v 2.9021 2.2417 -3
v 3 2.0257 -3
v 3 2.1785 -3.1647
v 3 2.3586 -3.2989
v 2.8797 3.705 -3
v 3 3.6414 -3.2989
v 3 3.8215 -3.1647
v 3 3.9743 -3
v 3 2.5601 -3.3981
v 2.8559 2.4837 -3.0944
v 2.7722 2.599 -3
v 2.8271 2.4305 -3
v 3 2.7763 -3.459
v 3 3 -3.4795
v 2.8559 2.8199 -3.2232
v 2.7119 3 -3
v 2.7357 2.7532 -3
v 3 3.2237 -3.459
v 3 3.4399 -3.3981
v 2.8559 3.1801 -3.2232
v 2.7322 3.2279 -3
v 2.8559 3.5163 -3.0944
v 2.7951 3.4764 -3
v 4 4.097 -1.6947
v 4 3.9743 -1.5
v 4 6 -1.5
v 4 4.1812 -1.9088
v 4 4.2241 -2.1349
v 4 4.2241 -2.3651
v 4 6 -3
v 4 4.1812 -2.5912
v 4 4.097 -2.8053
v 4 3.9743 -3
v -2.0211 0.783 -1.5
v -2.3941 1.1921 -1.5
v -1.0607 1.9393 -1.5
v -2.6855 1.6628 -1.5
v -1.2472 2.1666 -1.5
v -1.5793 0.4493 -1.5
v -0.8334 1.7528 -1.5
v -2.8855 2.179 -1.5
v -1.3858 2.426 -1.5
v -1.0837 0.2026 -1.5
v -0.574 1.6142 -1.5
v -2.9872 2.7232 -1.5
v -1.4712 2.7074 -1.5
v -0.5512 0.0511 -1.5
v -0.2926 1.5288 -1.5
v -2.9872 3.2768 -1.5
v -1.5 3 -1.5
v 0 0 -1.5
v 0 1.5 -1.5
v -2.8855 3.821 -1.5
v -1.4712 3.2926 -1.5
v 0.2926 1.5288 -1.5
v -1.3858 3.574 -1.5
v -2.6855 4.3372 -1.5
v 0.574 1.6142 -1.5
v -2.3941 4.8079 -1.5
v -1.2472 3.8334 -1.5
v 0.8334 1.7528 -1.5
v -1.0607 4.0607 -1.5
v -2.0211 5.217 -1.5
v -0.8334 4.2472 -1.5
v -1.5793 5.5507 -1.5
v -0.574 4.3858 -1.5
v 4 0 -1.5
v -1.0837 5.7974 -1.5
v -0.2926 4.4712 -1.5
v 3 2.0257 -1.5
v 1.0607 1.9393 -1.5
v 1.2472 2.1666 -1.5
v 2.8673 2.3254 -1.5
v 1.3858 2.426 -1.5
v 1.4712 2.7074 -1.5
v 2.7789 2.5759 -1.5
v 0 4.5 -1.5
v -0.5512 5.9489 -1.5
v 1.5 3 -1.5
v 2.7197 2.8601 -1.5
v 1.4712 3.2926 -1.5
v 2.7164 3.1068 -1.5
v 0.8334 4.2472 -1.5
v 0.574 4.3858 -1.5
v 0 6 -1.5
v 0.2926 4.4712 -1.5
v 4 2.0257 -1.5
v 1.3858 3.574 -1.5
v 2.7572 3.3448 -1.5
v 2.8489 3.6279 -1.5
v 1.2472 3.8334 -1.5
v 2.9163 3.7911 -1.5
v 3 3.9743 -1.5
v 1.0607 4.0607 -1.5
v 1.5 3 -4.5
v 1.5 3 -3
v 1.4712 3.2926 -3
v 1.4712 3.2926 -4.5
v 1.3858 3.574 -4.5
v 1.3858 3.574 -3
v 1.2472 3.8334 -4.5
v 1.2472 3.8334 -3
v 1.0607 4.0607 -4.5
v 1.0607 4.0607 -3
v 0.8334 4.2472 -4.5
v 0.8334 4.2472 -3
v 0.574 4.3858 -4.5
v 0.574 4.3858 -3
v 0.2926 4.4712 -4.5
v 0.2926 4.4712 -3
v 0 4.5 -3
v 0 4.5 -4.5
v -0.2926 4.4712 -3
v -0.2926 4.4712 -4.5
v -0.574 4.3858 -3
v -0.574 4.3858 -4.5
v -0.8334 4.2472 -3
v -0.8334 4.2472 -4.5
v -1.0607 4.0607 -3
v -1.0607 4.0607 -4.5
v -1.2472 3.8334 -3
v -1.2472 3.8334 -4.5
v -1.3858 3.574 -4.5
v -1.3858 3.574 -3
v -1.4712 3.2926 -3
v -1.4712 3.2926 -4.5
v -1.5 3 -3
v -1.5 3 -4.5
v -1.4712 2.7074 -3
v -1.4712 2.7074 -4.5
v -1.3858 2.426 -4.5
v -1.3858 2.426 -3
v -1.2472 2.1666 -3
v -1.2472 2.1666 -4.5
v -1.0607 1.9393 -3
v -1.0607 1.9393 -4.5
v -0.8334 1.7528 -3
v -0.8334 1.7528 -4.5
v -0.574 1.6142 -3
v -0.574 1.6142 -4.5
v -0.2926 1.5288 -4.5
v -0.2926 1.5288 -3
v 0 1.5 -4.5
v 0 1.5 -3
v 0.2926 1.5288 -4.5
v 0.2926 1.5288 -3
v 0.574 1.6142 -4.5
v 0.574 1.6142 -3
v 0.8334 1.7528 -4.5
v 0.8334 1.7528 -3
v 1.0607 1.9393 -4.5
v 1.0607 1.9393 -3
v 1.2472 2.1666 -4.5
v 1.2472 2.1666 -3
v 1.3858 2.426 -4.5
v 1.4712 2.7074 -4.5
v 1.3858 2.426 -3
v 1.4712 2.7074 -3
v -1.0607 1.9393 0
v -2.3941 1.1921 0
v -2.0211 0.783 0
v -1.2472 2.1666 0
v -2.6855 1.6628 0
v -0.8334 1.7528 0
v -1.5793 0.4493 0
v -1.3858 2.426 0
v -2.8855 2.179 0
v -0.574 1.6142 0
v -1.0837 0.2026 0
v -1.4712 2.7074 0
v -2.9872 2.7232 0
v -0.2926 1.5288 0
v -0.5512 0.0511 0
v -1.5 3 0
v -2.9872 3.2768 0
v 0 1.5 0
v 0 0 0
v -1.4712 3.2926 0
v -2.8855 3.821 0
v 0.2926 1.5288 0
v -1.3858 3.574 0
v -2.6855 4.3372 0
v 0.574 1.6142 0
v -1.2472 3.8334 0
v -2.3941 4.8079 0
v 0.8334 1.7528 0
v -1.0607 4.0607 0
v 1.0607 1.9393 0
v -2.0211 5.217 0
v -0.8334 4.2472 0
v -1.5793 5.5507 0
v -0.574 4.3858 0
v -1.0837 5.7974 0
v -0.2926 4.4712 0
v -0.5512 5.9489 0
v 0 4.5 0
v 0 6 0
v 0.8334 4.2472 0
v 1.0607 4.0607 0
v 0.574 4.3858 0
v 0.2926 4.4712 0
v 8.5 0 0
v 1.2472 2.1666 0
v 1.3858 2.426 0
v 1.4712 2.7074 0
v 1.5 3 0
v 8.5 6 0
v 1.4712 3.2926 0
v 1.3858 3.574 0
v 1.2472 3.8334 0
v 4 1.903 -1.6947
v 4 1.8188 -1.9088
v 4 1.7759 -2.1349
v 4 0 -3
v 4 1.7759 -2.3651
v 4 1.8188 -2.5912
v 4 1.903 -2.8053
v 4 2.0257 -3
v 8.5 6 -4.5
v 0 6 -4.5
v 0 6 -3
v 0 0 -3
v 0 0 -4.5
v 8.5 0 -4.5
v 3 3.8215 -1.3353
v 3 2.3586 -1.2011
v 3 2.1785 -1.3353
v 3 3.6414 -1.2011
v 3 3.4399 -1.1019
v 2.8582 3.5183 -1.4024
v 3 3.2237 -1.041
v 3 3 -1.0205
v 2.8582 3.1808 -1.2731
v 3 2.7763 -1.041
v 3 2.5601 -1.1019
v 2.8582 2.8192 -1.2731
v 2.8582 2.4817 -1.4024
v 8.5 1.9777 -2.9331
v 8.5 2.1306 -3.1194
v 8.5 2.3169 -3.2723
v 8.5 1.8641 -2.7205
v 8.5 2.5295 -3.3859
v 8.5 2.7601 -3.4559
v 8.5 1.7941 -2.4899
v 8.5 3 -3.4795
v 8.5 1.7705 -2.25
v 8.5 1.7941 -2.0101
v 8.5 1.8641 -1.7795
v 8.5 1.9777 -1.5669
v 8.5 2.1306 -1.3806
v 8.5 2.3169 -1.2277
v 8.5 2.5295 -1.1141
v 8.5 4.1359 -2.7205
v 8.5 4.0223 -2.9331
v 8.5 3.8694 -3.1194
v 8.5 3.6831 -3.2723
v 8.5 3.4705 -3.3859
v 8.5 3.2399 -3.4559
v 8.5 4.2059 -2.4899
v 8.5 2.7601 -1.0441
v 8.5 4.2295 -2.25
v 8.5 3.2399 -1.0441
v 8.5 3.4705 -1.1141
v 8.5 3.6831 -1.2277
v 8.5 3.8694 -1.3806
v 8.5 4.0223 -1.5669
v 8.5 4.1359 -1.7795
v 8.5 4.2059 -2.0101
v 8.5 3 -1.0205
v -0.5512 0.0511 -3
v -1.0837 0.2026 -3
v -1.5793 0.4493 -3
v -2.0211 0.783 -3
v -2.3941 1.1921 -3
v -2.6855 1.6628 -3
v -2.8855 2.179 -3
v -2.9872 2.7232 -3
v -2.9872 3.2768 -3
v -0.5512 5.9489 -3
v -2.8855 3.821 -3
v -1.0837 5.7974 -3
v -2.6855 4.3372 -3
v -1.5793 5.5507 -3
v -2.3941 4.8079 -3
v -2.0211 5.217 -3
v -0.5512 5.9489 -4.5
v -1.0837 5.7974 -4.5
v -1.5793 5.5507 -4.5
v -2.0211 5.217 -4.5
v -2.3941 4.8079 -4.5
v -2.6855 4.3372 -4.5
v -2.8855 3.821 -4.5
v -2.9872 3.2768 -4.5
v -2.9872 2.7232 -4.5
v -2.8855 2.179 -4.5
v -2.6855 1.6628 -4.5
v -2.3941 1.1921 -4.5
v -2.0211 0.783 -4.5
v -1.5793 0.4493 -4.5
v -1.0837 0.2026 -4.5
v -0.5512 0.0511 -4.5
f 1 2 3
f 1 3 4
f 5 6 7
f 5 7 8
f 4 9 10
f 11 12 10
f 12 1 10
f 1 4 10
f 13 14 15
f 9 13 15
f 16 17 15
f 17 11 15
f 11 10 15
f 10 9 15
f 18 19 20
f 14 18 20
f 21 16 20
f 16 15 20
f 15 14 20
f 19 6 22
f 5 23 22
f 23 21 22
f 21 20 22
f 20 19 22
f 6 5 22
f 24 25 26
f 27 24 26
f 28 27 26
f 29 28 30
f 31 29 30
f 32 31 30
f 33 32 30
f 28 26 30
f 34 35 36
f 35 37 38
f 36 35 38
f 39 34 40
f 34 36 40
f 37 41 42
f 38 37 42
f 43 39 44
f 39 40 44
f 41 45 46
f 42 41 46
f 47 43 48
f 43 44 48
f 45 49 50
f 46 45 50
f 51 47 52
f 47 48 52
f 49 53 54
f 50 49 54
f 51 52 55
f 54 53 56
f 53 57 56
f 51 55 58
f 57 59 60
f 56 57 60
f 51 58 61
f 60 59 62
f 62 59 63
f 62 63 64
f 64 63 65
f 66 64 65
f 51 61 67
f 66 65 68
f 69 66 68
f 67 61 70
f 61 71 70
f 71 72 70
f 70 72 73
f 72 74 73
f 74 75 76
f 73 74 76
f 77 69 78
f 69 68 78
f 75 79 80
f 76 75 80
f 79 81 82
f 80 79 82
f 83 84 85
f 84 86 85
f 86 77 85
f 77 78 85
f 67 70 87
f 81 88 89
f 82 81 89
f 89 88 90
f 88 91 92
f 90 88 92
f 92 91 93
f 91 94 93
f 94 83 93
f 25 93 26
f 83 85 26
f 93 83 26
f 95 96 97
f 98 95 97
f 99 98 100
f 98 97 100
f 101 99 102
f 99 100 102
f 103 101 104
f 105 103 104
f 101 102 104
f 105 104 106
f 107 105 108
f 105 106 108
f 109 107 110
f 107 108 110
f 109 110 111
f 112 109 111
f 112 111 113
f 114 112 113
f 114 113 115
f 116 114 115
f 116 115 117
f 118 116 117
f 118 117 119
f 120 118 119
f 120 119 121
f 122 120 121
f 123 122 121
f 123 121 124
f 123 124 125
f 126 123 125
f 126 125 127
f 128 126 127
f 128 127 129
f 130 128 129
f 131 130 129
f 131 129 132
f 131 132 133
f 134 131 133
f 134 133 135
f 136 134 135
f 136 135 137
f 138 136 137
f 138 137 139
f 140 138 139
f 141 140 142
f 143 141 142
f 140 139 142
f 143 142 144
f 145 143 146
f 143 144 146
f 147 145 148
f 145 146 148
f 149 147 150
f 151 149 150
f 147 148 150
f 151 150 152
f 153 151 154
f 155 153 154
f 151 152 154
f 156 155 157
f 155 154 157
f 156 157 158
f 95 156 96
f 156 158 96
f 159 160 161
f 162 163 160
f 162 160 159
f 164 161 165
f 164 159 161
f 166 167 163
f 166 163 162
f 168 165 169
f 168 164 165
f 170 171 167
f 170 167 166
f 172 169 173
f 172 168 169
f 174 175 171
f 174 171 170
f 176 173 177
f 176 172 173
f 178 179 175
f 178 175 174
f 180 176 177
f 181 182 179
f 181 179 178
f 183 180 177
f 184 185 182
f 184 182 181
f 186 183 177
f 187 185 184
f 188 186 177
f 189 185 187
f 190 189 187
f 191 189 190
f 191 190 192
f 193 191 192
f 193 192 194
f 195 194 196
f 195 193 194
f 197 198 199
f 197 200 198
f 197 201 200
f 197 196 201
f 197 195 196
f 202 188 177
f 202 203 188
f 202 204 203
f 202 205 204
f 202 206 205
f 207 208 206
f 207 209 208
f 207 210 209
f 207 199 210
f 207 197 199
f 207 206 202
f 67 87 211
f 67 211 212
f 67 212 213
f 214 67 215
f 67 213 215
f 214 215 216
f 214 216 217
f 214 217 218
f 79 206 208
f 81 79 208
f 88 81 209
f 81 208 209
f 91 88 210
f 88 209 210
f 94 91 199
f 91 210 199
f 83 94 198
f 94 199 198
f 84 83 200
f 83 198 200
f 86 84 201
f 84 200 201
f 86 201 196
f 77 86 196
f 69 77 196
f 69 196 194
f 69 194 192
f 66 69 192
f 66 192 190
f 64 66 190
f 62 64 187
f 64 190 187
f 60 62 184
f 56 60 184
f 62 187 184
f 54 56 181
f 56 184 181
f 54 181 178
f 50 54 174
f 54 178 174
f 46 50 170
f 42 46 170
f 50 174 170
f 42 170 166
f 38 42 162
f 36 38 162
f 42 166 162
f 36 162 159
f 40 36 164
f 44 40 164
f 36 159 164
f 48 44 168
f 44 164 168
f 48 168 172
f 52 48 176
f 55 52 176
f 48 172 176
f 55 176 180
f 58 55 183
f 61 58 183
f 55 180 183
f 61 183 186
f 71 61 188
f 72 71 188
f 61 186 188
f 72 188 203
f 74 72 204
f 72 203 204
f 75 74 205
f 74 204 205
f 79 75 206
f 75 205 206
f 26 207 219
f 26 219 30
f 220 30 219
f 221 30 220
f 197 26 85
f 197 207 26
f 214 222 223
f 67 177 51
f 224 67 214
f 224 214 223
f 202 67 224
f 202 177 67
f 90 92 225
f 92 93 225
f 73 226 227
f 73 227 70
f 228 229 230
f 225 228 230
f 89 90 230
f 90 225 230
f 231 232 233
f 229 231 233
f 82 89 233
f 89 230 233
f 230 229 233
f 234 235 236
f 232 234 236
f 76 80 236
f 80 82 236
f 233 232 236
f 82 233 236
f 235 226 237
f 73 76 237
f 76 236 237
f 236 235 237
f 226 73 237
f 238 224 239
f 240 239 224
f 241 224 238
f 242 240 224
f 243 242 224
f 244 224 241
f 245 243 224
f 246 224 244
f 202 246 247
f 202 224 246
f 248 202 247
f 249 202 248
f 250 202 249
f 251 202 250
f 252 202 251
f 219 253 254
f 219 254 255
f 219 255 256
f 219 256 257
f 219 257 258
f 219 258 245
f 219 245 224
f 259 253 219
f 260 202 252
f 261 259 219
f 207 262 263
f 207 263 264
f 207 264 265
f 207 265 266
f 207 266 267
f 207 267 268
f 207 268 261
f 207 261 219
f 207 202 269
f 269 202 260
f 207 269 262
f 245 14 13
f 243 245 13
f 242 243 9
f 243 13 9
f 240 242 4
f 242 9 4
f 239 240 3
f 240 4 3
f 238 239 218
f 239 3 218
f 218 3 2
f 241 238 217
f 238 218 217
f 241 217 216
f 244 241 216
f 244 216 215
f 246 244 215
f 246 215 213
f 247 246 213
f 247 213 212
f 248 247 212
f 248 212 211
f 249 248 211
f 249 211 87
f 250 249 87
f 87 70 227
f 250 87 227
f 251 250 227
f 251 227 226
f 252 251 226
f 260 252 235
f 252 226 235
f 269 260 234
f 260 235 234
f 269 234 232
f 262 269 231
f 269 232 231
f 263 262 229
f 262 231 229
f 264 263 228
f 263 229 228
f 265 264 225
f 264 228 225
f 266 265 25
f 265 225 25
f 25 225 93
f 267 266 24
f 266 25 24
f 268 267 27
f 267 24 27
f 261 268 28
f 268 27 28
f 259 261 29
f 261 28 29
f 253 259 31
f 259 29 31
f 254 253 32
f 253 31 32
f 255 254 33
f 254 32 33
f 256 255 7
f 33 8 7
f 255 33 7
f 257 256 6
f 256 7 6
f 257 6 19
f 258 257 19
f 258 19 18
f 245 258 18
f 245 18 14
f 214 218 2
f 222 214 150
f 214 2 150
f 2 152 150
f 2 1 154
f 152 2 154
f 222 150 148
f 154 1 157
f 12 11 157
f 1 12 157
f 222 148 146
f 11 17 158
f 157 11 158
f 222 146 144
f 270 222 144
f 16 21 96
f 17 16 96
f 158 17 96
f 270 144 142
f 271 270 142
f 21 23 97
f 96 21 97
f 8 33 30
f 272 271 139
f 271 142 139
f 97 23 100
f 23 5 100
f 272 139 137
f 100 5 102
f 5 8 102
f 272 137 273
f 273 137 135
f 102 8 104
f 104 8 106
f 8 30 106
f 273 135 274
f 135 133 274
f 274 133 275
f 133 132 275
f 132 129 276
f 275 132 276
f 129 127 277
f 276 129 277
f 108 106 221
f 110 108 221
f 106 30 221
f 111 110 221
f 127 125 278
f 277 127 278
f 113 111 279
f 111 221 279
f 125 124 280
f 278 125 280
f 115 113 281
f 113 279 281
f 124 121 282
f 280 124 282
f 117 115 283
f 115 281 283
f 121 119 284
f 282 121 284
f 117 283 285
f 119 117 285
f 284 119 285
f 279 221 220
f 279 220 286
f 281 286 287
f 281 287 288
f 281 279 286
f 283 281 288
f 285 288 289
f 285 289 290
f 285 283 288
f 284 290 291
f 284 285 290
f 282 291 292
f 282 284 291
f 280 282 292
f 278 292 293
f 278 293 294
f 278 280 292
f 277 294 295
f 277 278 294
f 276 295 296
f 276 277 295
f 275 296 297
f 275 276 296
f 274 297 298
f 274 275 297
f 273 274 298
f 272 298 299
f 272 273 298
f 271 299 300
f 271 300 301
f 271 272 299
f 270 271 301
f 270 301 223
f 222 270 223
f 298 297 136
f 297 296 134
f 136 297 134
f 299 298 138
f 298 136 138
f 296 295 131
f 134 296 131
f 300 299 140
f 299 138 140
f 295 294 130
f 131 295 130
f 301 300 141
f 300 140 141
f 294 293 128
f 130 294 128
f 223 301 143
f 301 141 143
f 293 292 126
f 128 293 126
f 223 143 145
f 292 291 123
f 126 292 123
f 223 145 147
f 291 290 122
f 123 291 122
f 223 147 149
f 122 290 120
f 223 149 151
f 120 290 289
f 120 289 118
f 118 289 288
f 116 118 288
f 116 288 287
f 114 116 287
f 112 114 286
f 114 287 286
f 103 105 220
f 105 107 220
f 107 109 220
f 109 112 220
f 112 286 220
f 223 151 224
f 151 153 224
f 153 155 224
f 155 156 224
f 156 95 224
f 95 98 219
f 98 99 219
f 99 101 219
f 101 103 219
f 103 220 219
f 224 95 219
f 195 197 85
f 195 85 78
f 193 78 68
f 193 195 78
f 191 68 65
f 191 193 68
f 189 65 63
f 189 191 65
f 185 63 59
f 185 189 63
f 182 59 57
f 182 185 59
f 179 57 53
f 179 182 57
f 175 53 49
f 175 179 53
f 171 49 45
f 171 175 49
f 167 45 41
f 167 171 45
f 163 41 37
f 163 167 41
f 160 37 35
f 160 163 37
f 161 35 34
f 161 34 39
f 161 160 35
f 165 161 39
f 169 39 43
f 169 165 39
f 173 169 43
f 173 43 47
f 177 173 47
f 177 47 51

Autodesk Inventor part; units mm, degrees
ref_plane "YZ Plane" through (0, 0, 0) normal (1, 0, 0) x (0, 1, 0)
ref_plane "XZ Plane" through (0, 0, 0) normal (0, 1, 0) x (-1, 0, 0)
ref_plane "XY Plane" through (0, 0, 0) normal (0, 0, 1) x (1, 0, 0)
sketch "Sketch1" plane through (0, 0, 0) normal (0, 0, 1) x (1, 0, 0)
  line L0 (0, 0) -> (8.5, 0)
  line L1 (8.5, 0) -> (8.5, 6)
  line L2 (8.5, 6) -> (0, 6)
  line L3 (0, 6) -> (0, 0) construction
  circle A0 centre (0, 3) radius 3
  circle A1 centre (0, 3) radius 1.5
  dimension "d0" = 8.5
  dimension "d1" = 6
  dimension "d2" = 3
extrude "Extrusion1" add sketch "Sketch1" against normal blind 4.5
sketch "Sketch2" plane through (0, 6, 0) normal (0, 1, 0) x (1, 0, 0)
  line L0 (8.5, 0) -> (8.5, 4.5) projected
  line L1 (0, 0) -> (0, 0) projected
  line L2 (0, 0) -> (0, 4.5) projected
  line L3 (0, 4.5) -> (0, 4.5) projected
  line L4 (0, 0) -> (0, 4.5) projected
  line L5 (-3, 0) -> (-3, 4.5) projected
  line L6 (-3, 0) -> (0, 0) projected
  line L7 (0, 4.5) -> (-3, 4.5) projected
  line L8 (-3, 1.5) -> (4, 1.5)
  line L9 (4, 1.5) -> (4, 3)
  line L10 (4, 3) -> (-3, 3)
  line L11 (-3, 3) -> (-3, 1.5)
  point P0 (4, 2.25)
  point P1 (8.5, 2.25)
  dimension "d7" = 1.5
  dimension "d8" = 7
extrude "Extrusion2" cut sketch "Sketch2" against normal through all contours L8 L5 L10 L2 | L2 L10 L9 L8
sketch "Sketch3" plane through (8.5, 0, 0) normal (1, 0, 0) x (0, 0, -1)
  line L0 (4.5, 6) -> (4.5, 0) projected
  line L1 (0, 6) -> (4.5, 6) projected
  point P0 (2.25, 3)
  dimension "d11" = 3
  dimension "d12" = 2.25
hole "Hole1" at (8.5, 3, -2.25) direction (-1, 0, 0) diameter 2.459 depth 5.5 tip angle 118 thread size "M3x0.5" class "6H" standard "ANSI Metric M Profile"
properties part number "30 - Eccentric Rod 2" material "Steel AISI 1020 107 HR"
